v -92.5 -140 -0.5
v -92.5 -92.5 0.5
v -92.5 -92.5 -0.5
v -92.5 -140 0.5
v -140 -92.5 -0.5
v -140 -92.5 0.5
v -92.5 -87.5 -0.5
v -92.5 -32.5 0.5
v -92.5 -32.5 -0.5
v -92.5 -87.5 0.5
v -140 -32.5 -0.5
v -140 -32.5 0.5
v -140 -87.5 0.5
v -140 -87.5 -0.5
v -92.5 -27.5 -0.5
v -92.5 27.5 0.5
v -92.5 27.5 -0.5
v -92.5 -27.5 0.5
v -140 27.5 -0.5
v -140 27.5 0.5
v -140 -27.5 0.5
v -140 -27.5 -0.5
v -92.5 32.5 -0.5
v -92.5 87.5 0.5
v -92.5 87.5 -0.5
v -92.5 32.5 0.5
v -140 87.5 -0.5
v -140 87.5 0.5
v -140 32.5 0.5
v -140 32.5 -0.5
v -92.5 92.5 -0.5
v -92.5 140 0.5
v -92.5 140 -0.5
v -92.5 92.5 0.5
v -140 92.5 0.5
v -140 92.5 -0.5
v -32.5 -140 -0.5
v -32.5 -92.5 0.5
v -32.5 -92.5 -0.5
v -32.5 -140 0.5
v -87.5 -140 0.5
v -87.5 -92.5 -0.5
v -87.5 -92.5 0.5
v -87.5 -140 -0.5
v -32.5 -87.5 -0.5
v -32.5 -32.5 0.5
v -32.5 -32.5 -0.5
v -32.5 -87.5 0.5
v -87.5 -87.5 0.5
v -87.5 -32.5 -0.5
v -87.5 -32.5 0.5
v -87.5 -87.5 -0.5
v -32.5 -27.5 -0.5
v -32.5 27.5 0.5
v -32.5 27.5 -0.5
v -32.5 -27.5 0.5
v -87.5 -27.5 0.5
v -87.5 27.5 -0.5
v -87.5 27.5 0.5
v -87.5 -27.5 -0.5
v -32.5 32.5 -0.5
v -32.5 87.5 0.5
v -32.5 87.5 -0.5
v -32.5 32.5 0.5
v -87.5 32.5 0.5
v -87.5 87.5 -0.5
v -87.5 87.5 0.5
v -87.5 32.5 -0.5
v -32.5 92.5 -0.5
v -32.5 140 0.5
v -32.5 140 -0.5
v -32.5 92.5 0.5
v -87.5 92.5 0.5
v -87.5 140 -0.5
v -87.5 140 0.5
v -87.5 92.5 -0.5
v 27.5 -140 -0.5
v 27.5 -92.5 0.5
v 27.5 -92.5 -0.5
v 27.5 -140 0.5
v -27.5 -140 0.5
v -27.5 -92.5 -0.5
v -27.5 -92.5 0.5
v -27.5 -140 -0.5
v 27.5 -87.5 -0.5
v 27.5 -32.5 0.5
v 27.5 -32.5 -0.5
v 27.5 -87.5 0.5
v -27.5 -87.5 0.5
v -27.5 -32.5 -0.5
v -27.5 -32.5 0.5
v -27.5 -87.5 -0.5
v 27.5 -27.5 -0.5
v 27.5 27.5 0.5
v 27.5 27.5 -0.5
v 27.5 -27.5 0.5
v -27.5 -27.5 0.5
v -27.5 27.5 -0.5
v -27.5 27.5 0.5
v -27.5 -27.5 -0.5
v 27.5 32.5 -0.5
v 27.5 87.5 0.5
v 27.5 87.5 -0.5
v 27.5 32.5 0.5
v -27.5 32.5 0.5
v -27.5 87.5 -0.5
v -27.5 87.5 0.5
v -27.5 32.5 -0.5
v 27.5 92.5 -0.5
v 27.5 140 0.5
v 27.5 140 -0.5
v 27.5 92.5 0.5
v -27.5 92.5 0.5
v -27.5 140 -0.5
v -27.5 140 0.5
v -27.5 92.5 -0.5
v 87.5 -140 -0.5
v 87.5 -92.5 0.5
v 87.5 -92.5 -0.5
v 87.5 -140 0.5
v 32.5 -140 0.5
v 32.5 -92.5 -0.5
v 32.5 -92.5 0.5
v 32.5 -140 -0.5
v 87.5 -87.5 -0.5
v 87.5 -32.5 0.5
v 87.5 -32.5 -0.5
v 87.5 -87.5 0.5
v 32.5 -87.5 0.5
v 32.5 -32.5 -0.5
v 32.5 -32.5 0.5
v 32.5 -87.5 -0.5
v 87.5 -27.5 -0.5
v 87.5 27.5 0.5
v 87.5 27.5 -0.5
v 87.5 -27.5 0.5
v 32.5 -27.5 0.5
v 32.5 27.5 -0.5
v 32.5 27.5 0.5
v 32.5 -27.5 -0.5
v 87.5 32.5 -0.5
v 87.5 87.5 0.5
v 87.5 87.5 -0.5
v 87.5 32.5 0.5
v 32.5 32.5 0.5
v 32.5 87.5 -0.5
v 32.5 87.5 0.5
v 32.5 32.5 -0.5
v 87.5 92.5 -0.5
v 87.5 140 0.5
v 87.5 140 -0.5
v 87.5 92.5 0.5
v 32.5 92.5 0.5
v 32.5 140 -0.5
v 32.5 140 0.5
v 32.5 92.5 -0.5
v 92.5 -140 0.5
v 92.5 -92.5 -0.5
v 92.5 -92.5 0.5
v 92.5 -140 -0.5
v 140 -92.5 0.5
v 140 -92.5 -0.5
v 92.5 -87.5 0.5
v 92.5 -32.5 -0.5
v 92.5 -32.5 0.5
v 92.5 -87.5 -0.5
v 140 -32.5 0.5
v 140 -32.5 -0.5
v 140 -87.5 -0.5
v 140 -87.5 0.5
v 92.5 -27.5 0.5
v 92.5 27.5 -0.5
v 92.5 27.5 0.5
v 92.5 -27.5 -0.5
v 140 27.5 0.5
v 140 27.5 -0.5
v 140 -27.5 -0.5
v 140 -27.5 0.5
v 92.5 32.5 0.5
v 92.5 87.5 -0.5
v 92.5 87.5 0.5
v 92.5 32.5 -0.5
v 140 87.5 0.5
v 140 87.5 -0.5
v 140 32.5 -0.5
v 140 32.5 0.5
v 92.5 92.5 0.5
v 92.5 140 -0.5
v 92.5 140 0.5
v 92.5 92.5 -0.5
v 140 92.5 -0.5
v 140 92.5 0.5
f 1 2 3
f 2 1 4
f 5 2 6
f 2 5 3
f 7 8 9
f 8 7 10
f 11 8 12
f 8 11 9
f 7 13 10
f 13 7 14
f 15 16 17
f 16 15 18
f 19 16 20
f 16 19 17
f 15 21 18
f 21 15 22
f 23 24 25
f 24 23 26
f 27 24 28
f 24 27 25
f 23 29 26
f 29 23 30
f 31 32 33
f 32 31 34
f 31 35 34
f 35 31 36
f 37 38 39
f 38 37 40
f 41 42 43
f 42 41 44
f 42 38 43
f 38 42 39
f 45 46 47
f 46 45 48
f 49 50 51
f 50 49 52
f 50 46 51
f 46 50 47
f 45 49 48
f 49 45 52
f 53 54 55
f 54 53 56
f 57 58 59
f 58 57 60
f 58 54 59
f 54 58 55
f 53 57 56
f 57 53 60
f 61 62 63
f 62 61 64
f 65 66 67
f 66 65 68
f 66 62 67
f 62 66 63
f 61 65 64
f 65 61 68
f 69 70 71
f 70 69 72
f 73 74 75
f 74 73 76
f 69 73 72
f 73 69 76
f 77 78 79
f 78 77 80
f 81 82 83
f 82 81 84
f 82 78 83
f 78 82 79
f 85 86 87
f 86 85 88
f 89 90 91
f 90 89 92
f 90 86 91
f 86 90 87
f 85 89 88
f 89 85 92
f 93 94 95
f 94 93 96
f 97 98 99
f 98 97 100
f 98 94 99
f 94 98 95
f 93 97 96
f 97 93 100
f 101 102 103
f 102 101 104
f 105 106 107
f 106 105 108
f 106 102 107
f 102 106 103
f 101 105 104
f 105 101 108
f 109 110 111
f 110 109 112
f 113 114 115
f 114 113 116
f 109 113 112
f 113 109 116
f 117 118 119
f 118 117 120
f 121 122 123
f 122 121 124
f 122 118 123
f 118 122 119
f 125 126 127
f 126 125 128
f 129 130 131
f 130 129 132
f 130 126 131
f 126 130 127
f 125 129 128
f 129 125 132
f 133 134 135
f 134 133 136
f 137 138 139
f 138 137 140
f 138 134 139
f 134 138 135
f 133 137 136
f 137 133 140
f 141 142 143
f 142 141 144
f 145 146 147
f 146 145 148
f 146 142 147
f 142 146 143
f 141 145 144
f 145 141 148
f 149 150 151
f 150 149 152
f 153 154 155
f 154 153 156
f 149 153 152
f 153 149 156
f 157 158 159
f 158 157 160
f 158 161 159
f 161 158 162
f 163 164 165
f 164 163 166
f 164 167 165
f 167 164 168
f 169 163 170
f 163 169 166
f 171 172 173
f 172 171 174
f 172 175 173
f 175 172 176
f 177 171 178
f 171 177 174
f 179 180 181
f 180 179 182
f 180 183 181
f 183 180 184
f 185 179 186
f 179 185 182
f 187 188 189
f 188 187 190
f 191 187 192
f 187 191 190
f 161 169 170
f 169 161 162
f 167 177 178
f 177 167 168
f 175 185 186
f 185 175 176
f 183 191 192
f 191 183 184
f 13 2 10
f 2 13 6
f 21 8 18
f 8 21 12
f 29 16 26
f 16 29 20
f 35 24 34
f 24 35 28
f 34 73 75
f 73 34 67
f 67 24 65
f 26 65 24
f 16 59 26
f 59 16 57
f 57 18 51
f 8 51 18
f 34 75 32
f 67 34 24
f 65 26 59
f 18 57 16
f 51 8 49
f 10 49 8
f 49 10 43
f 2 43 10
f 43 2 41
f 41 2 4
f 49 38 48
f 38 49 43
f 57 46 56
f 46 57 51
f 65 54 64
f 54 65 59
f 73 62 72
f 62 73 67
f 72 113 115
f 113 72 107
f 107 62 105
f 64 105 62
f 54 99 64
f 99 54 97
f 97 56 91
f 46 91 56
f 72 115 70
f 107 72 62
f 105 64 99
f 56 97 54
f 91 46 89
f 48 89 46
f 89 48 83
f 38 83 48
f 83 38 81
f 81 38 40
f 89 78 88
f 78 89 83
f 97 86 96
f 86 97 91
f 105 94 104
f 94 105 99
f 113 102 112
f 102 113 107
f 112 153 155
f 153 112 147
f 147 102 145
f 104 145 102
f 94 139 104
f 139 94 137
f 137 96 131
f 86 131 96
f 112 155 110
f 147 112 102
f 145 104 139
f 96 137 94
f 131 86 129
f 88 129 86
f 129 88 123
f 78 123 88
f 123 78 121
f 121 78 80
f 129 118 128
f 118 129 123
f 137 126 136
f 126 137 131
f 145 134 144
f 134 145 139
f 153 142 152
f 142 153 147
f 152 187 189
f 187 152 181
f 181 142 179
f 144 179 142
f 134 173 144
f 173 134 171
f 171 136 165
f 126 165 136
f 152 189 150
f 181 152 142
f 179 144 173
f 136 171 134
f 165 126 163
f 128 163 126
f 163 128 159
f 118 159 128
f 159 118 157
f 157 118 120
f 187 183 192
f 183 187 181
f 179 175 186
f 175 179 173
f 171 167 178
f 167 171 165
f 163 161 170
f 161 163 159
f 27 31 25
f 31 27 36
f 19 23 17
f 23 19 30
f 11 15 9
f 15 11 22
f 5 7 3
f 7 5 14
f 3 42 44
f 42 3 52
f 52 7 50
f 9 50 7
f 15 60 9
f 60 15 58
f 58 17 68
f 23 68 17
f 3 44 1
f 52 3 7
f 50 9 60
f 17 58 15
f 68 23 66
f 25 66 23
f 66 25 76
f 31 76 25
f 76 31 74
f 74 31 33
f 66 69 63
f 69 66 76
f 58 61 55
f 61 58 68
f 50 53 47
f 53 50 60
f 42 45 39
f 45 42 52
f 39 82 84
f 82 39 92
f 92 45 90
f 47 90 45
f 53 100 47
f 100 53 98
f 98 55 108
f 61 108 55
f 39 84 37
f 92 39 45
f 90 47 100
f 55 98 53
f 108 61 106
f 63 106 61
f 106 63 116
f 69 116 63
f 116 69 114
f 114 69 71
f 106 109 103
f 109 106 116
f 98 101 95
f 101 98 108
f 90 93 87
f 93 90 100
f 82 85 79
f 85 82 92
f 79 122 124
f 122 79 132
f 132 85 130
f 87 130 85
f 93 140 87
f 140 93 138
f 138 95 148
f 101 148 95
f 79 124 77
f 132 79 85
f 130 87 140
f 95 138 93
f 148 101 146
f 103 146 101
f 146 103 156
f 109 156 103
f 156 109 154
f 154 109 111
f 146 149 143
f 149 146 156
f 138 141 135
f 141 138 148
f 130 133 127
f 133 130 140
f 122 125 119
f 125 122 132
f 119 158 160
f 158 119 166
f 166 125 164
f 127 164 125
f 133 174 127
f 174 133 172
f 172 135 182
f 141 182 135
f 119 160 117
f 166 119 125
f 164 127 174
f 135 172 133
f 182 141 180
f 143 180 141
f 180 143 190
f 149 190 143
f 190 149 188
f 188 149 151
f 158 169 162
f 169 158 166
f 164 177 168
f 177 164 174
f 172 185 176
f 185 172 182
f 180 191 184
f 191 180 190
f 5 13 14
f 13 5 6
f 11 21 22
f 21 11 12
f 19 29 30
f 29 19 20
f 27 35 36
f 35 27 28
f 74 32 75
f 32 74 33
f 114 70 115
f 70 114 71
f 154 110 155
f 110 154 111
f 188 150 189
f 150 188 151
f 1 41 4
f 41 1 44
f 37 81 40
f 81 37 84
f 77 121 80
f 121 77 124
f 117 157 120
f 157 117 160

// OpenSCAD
//test_cube();
level_check();

module level_check(){
    difference(){
        cube([280, 280, 1], center=true);
        for(X=[-2,-1,0,1,2], Y=[-2,-1,0,1,2])
            translate([60*X,60*Y,0]) cube([55,55,2], center=true);
    }
}

module test_cube(size=30, h=10, wall=1){
    translate([-size/2, -size/2, 0])
    difference(){
        cube([size, size, h]);
        translate([wall, wall, wall]) 
            cube([size-wall*2, size-wall*2, h]);
    }
}
